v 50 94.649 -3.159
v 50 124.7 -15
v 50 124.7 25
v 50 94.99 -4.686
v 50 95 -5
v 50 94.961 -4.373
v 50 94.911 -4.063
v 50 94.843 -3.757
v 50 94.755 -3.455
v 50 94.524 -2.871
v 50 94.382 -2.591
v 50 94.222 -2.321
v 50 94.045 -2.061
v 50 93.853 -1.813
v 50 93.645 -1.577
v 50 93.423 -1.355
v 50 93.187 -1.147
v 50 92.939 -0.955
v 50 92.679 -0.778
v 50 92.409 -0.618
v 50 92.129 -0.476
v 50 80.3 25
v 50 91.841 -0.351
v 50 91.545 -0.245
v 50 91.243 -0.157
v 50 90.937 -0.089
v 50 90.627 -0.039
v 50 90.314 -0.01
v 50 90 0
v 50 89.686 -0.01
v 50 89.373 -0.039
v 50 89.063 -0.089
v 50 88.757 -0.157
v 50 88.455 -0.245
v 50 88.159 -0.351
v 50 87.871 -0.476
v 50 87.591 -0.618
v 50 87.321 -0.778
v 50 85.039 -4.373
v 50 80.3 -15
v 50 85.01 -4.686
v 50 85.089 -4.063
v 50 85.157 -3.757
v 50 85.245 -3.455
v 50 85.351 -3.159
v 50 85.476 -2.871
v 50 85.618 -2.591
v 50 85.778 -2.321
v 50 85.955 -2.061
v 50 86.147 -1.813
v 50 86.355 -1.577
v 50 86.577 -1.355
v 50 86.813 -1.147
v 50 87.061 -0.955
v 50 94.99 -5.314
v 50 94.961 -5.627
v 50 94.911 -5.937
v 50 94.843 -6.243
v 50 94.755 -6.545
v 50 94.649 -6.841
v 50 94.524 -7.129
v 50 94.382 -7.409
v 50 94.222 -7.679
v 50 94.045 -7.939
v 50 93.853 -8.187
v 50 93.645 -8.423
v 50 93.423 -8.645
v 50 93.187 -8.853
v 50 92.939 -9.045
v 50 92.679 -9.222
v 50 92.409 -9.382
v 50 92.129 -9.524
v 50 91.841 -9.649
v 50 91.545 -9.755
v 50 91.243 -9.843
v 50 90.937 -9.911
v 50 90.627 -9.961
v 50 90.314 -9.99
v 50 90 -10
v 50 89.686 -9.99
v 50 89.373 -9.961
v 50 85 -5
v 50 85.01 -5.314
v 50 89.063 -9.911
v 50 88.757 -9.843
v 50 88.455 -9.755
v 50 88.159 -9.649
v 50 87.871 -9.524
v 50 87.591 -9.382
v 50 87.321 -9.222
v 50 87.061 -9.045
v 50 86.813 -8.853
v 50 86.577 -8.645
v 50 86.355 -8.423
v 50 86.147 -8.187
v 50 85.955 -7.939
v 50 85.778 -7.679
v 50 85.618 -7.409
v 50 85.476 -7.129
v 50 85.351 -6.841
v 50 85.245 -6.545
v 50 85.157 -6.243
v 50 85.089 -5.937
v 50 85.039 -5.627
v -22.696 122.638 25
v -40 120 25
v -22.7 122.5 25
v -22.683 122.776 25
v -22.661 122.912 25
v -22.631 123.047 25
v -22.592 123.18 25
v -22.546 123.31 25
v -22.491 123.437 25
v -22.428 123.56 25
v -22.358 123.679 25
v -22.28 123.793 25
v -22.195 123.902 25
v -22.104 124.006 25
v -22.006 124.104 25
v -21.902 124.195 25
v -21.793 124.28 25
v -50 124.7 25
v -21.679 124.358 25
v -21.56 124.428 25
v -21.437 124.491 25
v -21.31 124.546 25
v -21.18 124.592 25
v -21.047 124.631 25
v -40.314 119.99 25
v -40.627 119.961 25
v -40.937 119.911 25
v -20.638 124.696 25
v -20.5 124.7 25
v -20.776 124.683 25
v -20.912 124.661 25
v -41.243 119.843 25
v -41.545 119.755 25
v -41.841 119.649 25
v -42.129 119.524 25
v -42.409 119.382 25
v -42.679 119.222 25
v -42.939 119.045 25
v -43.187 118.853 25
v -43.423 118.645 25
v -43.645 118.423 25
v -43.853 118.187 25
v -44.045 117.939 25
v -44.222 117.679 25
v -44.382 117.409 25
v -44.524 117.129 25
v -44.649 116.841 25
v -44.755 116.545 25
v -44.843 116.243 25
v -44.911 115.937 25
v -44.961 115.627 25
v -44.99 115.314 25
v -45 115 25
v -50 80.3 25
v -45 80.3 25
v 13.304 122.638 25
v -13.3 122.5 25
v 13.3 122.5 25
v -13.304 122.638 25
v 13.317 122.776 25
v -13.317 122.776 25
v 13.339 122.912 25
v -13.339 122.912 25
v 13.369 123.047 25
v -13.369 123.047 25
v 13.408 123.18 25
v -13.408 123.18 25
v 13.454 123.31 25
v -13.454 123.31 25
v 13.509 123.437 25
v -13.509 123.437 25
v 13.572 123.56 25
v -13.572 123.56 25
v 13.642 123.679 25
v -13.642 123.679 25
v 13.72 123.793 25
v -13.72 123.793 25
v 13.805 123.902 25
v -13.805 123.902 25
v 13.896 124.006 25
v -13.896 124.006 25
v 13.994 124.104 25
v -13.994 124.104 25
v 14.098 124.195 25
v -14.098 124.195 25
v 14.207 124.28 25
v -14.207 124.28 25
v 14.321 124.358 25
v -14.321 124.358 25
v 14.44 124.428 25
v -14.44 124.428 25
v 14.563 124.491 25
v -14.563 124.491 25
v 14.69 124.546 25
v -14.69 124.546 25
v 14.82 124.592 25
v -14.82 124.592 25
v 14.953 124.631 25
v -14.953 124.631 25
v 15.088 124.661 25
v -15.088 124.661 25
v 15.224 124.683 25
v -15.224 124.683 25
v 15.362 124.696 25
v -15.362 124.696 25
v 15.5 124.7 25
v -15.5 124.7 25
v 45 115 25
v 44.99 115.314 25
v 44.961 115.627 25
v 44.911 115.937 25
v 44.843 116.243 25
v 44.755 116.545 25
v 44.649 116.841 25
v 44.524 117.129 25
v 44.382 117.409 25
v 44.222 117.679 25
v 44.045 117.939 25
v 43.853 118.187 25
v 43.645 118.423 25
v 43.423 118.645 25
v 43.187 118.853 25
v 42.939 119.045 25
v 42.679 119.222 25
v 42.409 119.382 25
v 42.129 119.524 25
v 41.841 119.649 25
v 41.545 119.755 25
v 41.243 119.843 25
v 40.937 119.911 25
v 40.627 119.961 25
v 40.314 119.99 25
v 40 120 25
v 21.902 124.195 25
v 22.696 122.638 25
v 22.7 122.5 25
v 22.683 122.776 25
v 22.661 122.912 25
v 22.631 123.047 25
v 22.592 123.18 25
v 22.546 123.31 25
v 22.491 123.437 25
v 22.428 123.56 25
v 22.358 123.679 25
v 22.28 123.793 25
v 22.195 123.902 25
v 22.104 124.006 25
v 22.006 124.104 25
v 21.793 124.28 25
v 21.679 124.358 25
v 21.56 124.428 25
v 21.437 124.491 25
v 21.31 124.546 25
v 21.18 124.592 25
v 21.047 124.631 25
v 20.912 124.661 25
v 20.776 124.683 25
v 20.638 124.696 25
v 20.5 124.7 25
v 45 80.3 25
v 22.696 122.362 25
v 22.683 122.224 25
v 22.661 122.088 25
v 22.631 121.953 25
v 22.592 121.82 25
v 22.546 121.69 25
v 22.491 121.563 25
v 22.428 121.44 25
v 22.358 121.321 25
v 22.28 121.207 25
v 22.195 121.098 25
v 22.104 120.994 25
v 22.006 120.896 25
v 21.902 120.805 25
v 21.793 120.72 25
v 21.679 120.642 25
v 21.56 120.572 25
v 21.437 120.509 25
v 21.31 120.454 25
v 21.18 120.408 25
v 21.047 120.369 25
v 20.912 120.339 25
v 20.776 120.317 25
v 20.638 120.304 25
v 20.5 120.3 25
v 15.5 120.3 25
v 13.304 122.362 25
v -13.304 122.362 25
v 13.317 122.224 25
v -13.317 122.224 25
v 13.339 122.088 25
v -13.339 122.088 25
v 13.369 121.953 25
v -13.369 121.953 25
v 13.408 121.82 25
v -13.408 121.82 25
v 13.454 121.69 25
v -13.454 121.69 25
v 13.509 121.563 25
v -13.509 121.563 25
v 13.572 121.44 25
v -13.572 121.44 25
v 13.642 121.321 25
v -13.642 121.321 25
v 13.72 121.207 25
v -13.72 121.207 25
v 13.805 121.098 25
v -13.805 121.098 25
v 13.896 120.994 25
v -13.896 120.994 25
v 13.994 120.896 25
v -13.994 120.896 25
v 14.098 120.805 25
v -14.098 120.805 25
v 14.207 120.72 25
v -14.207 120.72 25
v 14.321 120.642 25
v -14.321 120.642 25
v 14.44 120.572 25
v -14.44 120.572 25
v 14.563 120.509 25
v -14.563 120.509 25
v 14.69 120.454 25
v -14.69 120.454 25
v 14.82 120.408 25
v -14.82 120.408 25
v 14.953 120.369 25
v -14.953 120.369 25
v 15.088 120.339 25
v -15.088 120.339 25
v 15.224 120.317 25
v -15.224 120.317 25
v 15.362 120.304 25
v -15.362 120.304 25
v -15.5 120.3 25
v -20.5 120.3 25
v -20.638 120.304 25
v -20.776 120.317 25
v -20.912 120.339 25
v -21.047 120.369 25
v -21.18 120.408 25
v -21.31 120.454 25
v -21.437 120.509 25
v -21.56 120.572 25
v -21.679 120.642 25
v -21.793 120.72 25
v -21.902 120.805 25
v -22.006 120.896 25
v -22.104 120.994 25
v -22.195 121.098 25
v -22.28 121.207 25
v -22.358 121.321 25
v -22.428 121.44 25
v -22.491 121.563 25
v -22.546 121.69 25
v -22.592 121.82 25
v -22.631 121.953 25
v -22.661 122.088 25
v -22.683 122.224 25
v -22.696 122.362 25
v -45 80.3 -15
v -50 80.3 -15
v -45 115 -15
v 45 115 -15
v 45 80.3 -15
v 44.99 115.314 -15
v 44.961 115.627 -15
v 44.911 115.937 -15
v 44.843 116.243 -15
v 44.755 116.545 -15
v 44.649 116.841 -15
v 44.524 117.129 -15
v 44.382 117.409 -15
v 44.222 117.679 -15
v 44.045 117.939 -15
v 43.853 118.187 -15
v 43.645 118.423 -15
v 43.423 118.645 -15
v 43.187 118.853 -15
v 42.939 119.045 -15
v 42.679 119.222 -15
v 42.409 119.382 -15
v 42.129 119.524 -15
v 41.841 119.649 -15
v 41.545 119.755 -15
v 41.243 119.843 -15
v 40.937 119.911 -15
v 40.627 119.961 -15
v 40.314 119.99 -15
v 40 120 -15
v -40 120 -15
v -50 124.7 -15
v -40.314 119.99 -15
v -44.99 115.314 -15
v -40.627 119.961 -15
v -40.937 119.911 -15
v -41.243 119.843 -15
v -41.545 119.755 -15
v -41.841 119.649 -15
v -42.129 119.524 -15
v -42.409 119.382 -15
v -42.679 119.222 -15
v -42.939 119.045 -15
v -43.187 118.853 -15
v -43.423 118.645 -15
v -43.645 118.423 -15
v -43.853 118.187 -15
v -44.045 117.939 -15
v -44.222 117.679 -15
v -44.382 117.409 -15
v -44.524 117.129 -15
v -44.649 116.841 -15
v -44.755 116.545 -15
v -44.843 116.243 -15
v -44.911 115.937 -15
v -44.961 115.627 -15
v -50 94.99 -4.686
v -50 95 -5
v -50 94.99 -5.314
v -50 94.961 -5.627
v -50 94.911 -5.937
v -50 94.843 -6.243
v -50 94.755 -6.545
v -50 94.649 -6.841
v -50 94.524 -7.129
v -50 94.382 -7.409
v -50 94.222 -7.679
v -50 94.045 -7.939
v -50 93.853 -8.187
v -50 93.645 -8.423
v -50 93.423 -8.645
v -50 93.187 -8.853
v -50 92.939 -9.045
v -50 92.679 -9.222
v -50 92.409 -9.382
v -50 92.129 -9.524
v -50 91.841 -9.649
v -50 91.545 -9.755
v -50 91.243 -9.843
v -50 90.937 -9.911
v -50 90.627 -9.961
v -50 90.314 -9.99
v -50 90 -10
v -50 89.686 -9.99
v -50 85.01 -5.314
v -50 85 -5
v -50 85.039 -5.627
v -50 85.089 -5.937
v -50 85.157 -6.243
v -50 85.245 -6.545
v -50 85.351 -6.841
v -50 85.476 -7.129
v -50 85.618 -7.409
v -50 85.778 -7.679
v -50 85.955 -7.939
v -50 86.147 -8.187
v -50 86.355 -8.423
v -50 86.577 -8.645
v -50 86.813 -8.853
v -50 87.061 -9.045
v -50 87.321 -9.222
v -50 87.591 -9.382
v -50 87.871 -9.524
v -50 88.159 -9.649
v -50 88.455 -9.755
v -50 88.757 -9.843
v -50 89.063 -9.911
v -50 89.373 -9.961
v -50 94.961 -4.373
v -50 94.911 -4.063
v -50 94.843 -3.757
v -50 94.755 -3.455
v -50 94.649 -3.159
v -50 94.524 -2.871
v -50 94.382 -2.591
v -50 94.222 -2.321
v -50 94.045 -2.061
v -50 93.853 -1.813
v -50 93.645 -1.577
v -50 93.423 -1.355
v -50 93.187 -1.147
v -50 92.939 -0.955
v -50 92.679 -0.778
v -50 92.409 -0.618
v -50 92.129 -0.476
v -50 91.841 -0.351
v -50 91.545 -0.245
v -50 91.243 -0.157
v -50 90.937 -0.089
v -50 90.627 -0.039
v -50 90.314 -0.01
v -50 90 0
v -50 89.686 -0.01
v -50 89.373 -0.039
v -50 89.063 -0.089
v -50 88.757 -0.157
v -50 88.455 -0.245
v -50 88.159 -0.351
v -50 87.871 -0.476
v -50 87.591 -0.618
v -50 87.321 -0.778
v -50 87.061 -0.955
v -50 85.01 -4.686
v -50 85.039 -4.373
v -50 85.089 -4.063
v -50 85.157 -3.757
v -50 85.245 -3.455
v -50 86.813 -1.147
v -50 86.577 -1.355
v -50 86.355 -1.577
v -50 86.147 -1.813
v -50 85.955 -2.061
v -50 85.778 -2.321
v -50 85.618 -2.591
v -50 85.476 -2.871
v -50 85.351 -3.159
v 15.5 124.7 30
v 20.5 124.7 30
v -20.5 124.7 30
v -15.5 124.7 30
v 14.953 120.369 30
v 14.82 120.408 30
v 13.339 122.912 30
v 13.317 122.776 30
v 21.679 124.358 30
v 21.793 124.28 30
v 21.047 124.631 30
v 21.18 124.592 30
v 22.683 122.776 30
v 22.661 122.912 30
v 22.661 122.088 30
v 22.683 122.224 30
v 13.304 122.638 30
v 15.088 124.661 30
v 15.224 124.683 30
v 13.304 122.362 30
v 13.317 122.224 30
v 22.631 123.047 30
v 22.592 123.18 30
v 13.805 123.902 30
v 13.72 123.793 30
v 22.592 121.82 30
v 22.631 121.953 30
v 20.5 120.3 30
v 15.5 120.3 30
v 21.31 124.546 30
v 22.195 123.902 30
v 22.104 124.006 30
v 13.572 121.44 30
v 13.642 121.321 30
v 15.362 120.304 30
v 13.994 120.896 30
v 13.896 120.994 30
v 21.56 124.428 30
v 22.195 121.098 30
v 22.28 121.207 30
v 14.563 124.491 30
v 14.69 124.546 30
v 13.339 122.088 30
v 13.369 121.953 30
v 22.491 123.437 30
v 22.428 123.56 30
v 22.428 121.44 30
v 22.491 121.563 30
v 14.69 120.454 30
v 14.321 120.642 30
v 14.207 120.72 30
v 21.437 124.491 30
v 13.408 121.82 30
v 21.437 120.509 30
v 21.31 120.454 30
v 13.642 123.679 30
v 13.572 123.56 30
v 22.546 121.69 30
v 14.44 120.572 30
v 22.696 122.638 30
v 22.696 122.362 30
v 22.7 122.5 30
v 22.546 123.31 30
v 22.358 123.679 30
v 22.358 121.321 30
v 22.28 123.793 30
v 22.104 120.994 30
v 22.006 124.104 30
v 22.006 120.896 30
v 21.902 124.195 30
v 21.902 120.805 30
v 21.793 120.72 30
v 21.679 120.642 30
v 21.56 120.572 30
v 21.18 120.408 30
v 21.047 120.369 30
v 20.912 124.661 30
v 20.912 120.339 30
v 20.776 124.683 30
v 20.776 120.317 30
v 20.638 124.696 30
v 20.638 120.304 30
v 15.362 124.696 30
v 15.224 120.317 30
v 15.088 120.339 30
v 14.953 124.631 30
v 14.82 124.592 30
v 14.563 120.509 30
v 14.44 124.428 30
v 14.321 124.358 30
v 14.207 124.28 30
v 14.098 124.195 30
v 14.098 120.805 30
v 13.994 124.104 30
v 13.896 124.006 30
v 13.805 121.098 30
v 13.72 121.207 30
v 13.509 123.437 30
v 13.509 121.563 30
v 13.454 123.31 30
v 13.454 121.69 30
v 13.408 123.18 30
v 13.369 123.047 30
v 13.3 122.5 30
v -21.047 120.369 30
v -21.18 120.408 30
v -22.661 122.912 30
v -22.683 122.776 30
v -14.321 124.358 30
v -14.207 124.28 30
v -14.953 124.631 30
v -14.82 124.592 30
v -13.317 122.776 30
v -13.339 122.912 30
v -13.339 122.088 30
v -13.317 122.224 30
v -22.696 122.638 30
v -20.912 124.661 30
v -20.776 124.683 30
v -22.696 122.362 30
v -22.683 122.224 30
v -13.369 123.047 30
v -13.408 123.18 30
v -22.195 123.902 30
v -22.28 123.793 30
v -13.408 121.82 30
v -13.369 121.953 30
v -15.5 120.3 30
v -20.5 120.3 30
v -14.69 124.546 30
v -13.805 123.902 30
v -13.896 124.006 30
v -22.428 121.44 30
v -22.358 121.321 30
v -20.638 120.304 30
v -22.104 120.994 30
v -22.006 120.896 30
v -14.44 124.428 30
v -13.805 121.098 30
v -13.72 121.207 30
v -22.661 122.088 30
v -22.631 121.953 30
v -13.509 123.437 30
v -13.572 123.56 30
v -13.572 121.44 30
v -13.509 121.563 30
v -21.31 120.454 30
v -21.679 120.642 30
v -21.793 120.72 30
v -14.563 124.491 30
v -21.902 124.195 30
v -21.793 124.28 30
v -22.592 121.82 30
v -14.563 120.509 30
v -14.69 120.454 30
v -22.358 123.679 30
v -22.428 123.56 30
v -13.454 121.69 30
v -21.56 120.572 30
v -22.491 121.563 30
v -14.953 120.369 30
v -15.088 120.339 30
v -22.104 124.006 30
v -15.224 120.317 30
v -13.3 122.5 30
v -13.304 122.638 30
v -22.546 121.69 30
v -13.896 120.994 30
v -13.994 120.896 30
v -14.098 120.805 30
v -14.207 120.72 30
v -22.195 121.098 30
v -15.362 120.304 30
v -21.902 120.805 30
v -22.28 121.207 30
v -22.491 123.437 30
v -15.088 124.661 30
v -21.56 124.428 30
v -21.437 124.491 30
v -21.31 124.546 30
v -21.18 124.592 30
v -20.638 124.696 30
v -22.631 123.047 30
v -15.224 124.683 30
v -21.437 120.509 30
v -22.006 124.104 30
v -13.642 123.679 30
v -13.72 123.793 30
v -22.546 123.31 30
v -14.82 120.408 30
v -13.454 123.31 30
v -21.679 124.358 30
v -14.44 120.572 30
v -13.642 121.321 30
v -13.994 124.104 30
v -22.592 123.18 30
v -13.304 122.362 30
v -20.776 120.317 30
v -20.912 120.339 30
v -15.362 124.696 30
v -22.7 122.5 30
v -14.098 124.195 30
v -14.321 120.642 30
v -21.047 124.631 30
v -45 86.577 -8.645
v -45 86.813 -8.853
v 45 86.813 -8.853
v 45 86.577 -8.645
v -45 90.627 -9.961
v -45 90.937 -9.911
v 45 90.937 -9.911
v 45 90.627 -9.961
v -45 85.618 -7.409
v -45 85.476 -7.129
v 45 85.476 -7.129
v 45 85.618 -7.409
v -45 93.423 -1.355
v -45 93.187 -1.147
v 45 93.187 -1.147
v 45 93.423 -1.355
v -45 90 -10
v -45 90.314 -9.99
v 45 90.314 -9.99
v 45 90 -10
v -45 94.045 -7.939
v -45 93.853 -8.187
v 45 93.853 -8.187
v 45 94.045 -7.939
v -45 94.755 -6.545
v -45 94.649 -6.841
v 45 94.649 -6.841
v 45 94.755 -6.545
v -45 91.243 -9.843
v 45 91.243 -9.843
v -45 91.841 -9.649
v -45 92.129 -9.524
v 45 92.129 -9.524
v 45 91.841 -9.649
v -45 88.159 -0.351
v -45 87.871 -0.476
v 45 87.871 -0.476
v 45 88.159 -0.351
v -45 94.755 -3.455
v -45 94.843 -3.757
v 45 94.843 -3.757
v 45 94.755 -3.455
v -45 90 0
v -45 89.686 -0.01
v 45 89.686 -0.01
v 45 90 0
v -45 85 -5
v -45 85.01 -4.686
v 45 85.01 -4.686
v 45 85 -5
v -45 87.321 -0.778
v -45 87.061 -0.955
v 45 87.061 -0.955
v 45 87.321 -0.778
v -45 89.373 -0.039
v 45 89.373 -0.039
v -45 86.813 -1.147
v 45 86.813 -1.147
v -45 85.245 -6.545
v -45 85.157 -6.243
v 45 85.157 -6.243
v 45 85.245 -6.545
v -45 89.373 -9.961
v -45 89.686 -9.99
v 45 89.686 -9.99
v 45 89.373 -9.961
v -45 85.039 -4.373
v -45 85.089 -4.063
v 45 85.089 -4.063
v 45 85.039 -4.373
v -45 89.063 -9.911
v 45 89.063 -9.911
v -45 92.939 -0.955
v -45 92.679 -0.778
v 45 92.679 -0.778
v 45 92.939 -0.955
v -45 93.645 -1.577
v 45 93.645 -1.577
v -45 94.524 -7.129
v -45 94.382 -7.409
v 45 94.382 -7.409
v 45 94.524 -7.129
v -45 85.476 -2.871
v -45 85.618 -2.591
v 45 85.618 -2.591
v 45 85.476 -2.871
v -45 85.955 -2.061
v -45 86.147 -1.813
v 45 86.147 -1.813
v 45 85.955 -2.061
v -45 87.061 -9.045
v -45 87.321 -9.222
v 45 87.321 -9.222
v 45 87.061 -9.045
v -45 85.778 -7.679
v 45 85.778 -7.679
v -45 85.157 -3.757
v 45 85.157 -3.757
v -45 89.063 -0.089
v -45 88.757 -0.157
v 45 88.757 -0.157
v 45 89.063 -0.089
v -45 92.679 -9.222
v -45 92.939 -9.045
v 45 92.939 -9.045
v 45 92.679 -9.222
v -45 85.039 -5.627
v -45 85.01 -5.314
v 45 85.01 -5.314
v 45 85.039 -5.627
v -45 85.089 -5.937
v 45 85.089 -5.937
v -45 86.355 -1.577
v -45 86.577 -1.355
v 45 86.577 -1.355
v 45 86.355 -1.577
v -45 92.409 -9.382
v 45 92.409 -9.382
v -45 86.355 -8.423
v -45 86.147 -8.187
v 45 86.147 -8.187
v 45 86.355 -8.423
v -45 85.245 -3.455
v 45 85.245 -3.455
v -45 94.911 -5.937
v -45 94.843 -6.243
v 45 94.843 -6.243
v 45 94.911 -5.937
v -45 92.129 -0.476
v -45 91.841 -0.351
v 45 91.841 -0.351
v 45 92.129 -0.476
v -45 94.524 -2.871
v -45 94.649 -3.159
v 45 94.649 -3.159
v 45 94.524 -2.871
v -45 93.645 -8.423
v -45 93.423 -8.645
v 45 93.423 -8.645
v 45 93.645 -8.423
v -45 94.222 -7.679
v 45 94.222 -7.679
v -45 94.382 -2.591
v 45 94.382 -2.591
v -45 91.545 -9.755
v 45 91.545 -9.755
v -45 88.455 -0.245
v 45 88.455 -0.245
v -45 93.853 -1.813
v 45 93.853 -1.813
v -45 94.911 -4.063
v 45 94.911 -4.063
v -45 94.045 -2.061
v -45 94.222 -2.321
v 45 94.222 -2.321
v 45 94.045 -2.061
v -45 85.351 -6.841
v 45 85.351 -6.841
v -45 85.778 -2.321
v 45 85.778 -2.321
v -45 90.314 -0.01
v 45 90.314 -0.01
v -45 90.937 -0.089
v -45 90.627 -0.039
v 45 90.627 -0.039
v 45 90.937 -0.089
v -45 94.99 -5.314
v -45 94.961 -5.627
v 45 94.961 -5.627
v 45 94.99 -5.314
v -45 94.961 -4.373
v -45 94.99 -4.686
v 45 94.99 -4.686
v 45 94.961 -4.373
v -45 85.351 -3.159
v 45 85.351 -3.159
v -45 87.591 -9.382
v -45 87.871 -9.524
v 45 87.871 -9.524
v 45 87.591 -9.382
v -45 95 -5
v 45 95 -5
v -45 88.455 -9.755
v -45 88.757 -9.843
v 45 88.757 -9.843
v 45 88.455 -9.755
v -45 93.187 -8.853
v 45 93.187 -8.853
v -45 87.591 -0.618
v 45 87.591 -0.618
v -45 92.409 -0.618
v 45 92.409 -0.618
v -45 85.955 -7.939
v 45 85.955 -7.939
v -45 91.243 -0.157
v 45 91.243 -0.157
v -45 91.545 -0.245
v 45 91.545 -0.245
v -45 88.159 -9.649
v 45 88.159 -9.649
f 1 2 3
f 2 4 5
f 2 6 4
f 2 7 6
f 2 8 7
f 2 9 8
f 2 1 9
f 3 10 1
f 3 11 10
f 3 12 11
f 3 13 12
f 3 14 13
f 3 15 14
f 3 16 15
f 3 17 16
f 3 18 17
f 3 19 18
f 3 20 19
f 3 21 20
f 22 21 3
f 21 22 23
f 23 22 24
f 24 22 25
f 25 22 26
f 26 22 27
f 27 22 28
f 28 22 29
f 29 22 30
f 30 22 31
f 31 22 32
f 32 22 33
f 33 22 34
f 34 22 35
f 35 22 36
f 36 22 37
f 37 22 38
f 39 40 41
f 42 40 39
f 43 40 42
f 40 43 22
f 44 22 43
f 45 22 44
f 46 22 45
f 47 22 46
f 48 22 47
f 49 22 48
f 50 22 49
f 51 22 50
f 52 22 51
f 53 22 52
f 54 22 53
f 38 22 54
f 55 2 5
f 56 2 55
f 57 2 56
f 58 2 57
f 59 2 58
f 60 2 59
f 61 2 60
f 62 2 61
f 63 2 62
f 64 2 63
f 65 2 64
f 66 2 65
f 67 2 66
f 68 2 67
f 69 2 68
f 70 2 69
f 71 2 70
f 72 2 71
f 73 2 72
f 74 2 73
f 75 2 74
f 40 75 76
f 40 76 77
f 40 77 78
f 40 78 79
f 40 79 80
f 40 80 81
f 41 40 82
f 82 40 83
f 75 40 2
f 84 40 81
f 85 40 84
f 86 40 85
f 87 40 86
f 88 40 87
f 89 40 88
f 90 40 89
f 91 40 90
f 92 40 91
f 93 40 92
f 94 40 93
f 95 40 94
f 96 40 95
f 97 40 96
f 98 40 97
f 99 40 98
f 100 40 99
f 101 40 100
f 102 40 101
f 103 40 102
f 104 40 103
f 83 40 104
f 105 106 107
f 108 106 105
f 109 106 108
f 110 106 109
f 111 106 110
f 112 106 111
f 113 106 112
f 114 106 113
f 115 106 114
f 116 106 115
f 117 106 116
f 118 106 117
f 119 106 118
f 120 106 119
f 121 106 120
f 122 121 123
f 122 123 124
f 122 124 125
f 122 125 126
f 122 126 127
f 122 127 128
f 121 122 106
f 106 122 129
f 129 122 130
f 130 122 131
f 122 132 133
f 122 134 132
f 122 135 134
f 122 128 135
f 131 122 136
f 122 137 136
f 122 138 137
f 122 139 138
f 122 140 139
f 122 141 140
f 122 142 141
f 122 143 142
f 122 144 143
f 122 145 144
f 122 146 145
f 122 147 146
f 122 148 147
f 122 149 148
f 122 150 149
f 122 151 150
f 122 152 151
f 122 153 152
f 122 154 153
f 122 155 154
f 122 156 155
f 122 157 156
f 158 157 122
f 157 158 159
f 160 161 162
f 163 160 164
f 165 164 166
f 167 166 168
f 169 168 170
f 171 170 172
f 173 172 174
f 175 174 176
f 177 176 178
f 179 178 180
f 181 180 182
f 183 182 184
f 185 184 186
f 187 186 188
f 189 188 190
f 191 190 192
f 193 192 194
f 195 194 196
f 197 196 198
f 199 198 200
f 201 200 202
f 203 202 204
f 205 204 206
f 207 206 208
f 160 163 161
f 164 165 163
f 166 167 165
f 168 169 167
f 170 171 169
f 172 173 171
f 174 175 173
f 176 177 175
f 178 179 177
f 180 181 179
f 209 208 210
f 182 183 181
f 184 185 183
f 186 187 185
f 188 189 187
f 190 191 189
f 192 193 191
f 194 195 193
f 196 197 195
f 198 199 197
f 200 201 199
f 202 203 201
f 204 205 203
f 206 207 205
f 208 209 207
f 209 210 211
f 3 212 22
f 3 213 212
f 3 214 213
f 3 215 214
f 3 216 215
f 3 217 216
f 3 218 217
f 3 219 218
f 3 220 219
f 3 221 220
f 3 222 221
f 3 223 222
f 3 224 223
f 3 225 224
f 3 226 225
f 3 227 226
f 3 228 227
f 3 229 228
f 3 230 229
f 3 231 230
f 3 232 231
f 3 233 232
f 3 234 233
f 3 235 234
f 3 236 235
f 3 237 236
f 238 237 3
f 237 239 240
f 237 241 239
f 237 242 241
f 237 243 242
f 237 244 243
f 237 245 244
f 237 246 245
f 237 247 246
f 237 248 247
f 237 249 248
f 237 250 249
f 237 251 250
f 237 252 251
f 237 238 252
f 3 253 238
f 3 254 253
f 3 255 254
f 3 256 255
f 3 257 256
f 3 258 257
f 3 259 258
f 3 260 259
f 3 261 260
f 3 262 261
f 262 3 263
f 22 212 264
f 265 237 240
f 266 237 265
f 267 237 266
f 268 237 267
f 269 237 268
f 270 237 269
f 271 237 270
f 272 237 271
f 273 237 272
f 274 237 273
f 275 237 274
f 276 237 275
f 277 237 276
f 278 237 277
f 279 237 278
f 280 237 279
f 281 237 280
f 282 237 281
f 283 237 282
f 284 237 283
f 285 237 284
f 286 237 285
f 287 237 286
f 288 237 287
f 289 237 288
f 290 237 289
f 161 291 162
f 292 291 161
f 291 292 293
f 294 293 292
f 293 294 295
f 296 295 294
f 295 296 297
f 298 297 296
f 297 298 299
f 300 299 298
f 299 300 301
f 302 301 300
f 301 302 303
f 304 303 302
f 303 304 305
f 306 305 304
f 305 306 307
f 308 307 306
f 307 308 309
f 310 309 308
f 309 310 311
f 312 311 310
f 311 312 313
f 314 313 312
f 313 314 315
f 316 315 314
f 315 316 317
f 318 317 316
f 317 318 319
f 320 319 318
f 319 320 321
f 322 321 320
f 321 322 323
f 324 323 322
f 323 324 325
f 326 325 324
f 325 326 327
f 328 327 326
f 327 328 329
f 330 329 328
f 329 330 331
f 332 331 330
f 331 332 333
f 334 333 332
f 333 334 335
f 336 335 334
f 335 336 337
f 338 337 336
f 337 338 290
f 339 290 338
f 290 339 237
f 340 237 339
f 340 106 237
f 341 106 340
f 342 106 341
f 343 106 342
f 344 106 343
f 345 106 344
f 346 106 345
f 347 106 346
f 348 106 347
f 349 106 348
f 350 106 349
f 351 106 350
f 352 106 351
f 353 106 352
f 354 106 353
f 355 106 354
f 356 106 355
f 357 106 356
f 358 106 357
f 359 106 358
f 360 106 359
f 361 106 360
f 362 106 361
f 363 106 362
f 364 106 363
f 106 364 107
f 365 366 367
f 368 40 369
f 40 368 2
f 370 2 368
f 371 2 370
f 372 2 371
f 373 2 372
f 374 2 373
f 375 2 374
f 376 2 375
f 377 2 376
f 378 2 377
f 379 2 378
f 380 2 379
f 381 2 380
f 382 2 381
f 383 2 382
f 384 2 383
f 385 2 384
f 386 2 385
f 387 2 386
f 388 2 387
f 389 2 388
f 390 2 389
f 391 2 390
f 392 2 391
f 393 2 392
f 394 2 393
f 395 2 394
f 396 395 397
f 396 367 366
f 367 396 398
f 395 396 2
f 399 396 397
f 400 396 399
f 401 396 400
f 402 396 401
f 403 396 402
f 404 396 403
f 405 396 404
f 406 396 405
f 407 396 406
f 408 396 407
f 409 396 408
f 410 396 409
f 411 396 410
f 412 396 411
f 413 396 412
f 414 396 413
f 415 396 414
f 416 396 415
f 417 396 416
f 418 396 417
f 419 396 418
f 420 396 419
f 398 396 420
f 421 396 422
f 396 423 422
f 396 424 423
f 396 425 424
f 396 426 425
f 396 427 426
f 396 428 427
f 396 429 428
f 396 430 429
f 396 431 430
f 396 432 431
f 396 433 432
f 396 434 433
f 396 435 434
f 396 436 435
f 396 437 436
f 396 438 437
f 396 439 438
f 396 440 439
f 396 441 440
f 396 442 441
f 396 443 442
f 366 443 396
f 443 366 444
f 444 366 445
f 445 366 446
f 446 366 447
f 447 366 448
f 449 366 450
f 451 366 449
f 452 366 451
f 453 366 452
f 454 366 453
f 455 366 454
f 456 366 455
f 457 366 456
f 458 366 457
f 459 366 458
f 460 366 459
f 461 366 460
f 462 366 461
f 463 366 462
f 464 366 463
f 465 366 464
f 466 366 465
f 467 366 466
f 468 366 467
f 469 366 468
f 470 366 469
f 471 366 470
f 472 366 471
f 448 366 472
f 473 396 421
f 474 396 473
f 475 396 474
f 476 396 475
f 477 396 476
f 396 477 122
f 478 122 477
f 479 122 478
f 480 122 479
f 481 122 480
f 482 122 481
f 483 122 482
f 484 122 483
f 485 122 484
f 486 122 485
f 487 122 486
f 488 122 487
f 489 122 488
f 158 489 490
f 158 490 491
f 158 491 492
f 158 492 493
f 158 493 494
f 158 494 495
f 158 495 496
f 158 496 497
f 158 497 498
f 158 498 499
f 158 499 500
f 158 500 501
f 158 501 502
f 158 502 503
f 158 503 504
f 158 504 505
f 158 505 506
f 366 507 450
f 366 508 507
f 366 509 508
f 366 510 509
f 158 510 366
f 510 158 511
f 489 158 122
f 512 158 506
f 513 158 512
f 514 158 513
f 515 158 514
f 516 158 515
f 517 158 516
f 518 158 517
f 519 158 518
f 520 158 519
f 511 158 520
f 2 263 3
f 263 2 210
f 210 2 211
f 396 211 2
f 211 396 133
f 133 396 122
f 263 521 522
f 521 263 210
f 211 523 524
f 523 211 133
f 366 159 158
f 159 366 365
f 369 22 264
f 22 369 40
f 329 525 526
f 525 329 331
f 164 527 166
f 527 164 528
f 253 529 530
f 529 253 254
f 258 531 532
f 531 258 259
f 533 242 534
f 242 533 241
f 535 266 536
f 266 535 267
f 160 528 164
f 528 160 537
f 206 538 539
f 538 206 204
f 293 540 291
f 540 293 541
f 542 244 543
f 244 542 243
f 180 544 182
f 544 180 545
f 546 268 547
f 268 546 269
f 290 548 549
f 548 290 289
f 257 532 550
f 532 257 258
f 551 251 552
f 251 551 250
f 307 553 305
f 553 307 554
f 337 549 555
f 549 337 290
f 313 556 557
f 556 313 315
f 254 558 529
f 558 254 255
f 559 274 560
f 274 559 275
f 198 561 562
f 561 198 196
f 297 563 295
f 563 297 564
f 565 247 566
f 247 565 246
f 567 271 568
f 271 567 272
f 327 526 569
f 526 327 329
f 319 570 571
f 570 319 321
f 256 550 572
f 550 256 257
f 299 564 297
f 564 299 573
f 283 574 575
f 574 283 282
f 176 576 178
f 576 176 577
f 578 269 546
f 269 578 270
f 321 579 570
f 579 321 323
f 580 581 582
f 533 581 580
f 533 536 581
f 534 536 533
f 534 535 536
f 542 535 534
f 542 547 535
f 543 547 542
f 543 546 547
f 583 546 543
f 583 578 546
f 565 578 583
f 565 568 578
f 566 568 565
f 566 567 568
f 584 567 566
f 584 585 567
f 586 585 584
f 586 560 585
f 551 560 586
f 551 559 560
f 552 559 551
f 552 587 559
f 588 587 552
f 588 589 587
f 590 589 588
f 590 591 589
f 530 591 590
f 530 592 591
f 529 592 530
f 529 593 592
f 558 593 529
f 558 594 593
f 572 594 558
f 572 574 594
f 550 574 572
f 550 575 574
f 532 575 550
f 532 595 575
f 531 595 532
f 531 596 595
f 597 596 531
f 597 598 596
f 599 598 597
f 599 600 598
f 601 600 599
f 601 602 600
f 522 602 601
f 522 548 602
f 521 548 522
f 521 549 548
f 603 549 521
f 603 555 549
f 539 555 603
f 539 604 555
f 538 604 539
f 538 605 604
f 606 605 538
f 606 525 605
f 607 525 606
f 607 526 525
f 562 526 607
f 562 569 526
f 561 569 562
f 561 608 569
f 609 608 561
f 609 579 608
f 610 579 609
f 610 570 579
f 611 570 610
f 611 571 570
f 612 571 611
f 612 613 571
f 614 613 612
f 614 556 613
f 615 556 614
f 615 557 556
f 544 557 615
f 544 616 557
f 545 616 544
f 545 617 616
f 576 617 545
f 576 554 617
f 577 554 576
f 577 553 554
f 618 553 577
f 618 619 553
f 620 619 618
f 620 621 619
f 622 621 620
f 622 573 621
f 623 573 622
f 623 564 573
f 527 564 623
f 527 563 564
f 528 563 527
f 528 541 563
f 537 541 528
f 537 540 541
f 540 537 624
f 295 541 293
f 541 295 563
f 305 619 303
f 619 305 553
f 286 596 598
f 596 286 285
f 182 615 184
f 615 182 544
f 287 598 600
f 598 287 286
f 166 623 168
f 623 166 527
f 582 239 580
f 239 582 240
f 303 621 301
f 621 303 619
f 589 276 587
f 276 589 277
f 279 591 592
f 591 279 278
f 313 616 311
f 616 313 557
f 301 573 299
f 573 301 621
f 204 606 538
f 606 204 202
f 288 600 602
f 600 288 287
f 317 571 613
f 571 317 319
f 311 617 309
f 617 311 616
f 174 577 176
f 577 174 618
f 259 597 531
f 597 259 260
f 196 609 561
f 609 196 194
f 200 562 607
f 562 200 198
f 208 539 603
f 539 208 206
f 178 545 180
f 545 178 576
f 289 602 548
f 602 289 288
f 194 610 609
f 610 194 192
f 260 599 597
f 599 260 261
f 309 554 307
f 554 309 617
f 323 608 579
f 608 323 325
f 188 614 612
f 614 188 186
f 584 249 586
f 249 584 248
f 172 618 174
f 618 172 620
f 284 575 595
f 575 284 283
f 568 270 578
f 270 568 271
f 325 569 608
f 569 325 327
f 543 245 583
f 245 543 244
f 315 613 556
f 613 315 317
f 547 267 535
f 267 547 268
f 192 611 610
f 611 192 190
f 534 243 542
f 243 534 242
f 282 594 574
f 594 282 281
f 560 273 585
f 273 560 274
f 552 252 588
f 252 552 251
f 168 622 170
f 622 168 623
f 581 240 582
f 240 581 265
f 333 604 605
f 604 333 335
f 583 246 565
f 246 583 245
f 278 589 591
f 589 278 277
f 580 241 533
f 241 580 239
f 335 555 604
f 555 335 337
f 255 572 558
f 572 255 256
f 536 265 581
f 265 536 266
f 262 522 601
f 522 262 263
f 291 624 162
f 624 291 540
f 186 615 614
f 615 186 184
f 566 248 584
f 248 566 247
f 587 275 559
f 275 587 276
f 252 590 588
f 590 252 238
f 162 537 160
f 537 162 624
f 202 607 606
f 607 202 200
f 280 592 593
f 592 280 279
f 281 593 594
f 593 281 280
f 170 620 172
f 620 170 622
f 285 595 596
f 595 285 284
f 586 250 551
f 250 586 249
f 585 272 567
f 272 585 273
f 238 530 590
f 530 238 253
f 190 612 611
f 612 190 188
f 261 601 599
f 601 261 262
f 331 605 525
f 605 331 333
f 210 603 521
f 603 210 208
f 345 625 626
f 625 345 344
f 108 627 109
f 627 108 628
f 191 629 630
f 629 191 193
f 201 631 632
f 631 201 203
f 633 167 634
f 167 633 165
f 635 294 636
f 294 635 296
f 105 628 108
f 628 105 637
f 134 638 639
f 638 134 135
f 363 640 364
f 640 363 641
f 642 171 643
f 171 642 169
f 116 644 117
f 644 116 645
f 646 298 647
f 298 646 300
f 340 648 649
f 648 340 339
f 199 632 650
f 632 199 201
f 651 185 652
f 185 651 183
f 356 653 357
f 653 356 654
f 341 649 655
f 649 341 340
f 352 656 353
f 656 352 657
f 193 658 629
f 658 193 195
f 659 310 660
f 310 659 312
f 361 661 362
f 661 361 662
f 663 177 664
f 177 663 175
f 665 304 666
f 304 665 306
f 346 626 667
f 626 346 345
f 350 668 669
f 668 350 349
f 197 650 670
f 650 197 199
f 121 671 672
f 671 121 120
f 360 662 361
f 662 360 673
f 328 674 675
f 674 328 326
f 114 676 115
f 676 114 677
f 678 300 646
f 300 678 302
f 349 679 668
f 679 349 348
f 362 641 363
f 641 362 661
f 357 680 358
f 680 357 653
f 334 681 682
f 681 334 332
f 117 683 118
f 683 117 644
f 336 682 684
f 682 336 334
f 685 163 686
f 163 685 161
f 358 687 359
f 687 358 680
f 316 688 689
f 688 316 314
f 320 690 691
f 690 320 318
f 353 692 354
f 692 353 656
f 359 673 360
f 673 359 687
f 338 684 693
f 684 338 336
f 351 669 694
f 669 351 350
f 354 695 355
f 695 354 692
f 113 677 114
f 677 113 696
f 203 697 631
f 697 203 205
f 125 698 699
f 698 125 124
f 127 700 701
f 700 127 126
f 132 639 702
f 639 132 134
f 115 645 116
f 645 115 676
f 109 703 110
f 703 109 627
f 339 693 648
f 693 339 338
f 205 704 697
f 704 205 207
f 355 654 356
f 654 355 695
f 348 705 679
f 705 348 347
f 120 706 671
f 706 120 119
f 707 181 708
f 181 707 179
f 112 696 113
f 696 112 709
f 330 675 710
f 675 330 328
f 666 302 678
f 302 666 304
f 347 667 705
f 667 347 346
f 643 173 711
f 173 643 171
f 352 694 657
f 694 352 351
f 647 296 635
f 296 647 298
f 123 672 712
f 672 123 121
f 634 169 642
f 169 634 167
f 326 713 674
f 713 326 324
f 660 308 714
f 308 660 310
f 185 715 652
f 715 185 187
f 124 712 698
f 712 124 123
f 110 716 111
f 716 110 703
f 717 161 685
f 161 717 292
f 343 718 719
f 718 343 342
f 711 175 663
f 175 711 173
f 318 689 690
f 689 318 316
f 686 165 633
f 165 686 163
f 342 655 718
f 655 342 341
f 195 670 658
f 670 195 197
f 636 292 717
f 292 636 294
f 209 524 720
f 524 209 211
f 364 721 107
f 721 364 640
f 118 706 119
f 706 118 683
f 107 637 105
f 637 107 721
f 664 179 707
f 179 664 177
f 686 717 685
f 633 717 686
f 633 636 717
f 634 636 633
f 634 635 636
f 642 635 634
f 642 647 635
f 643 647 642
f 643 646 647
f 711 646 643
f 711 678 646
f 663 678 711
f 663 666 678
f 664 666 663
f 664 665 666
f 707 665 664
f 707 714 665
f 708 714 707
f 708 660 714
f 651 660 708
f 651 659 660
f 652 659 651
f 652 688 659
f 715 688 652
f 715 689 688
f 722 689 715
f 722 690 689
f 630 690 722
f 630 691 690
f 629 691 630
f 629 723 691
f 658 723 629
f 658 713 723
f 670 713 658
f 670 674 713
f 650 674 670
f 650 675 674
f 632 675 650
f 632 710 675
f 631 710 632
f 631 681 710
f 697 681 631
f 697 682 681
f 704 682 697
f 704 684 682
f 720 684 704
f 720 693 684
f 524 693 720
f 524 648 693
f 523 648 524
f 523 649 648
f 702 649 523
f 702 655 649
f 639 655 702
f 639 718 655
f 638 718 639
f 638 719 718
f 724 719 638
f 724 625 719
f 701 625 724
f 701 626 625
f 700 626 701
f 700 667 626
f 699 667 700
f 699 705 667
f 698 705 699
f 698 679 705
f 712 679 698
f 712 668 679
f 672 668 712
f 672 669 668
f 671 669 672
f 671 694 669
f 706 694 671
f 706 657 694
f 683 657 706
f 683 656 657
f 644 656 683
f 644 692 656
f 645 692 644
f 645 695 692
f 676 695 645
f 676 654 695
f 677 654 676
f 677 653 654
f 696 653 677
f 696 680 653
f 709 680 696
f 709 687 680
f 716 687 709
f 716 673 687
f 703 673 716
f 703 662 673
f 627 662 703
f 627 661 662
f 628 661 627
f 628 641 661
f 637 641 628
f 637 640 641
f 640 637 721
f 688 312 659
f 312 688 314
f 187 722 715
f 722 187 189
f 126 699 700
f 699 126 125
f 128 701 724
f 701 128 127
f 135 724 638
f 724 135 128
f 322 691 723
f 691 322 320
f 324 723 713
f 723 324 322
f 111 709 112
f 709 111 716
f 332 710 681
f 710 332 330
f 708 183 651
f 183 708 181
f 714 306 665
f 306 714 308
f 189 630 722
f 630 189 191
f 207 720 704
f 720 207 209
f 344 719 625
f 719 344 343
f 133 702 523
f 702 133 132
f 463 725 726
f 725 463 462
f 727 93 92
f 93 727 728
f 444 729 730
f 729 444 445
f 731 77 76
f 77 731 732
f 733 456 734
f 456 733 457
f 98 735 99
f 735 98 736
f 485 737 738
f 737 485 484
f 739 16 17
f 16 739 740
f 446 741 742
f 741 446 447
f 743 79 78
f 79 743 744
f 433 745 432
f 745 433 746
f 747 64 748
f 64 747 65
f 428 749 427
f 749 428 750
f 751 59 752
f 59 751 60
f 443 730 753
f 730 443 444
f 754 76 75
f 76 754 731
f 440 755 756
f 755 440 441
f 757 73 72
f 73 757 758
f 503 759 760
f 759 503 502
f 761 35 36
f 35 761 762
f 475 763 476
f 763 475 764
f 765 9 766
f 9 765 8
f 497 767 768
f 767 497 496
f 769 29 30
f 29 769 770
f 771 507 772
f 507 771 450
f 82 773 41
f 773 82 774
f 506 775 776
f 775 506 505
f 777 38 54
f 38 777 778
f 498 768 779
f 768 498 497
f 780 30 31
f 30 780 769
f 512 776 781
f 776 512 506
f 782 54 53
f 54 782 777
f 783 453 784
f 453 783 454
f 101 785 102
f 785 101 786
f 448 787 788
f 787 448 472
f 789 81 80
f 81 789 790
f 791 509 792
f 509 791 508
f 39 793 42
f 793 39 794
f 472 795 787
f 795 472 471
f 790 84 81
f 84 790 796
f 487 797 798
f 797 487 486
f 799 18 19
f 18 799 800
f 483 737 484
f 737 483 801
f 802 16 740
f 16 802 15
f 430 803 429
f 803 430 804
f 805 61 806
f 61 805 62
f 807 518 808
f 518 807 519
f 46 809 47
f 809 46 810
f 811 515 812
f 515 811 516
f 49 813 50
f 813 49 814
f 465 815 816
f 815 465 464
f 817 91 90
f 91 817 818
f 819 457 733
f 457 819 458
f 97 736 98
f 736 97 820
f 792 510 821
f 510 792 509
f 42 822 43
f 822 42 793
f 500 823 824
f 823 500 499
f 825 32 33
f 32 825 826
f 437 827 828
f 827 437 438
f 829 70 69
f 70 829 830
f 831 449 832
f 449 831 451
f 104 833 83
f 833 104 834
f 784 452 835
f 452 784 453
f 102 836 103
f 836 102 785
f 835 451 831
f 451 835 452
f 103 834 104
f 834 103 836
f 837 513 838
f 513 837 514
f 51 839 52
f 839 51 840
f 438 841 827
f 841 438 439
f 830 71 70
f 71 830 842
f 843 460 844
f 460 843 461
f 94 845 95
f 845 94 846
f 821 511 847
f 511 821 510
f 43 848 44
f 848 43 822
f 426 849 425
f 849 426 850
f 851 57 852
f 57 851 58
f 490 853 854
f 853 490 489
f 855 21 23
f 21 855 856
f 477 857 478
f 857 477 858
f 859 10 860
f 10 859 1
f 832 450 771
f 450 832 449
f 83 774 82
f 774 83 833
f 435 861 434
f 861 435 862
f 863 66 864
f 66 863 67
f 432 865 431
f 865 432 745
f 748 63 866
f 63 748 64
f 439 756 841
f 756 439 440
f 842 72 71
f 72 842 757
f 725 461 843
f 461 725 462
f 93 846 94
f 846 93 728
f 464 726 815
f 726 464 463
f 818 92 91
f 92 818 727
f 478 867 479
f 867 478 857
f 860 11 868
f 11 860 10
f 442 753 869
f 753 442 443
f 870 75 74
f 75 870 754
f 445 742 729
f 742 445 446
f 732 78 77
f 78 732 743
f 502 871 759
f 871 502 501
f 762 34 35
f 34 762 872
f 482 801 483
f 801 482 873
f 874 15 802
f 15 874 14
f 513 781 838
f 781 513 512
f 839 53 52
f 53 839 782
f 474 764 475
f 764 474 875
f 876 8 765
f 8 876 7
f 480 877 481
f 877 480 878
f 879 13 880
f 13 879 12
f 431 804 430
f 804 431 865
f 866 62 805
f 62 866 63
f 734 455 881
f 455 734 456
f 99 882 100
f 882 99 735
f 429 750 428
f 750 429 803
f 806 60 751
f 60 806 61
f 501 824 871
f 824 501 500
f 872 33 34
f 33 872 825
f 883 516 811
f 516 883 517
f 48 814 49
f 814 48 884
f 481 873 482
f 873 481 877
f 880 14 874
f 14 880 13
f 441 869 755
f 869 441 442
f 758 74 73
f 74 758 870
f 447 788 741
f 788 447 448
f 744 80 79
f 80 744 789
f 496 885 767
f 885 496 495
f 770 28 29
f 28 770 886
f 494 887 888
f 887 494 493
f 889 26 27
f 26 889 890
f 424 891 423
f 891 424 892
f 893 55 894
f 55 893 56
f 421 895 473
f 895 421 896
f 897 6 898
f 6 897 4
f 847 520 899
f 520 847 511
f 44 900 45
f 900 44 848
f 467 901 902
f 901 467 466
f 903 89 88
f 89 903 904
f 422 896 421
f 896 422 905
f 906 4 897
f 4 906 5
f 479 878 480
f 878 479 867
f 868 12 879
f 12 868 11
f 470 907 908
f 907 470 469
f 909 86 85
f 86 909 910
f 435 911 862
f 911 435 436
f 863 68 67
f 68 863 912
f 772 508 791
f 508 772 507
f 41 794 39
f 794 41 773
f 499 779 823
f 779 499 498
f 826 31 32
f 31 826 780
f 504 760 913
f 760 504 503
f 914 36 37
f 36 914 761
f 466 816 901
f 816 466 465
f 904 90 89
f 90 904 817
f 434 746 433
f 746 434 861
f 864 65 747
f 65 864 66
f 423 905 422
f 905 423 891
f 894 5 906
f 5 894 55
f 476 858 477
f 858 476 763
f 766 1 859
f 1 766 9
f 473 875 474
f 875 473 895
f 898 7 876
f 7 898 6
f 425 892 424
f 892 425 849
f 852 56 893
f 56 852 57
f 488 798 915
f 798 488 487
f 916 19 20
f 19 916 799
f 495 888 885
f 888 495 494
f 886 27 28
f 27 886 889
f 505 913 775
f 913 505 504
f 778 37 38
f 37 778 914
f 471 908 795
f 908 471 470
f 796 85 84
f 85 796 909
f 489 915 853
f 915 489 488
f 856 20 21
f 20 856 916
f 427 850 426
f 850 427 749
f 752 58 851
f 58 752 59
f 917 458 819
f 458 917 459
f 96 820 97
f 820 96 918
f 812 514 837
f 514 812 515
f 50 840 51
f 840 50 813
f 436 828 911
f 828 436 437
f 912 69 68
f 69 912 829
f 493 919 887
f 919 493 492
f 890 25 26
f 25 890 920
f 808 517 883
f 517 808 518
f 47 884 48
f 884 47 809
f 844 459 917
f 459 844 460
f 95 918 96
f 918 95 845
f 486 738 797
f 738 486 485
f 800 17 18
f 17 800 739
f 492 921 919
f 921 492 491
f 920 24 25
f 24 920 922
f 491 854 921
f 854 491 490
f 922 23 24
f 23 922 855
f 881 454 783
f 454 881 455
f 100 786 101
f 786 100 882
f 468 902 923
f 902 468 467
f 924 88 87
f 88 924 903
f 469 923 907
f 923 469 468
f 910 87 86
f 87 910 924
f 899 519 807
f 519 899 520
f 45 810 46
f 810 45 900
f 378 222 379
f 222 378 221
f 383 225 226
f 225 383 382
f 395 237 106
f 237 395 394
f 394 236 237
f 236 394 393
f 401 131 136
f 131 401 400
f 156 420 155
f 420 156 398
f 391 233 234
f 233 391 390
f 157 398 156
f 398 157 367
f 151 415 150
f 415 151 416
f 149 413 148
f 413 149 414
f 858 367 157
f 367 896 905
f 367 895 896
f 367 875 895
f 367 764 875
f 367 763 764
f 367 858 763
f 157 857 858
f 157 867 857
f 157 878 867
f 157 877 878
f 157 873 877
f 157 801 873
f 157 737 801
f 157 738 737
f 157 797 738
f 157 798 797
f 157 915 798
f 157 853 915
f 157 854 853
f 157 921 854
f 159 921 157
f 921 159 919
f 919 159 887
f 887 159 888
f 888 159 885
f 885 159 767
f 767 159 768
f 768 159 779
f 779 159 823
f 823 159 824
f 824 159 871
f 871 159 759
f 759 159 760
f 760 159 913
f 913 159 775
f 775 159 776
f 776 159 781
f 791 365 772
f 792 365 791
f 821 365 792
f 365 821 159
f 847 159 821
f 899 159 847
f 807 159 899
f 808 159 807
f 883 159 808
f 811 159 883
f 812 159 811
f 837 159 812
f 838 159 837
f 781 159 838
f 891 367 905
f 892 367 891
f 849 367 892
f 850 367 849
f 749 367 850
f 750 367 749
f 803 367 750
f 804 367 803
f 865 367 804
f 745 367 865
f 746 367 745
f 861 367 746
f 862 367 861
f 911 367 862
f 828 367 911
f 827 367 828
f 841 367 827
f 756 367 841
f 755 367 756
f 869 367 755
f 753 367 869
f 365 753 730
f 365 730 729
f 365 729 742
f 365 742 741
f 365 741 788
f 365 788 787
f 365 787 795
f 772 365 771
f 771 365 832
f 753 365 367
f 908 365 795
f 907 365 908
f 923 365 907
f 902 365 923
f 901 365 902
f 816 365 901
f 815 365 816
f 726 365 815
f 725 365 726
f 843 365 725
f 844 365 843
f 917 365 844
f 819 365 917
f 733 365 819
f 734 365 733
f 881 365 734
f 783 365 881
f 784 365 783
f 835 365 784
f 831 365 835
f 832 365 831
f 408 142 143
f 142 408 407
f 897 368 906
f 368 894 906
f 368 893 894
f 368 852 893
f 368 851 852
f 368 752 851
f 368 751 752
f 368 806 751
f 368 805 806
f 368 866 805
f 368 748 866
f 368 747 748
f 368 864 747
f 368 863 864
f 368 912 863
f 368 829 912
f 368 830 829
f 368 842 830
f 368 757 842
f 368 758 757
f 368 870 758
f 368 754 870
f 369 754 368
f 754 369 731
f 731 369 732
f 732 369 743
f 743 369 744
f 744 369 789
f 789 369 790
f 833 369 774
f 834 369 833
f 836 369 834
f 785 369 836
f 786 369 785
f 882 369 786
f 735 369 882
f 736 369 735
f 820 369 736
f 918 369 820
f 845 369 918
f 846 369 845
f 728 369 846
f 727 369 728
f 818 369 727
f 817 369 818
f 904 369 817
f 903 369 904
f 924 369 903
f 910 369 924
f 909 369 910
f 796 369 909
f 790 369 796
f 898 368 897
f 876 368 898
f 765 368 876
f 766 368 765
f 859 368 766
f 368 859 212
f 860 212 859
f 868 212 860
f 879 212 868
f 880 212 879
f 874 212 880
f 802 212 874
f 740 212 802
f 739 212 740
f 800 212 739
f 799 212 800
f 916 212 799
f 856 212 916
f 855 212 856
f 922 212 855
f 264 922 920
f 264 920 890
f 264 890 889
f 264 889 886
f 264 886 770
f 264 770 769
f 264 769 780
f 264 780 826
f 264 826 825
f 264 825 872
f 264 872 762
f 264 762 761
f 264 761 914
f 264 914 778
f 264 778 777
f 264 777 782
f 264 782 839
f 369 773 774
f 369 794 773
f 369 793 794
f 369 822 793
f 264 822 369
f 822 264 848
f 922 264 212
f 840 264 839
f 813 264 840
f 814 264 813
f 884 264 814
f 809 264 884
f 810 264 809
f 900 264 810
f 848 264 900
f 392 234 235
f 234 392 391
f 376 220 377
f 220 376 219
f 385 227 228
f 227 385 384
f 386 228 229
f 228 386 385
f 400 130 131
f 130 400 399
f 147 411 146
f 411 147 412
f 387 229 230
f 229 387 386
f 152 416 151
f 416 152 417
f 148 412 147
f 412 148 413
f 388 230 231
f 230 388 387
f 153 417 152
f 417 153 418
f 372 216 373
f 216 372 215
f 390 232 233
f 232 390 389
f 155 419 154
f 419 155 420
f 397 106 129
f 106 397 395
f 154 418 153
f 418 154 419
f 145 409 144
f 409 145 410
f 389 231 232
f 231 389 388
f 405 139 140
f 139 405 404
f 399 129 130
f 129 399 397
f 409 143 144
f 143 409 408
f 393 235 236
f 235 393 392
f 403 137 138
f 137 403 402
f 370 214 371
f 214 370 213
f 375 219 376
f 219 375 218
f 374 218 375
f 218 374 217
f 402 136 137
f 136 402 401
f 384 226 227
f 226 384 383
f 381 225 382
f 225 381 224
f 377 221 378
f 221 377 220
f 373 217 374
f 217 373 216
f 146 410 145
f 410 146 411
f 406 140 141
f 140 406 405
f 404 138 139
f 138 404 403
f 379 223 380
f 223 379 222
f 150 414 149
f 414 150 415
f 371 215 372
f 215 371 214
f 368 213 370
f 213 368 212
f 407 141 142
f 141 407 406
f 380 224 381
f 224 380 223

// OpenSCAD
$fn=100;
//boxlib();
!boxFix();
module boxlib(){
    translate([0,0,-2]) rotate_extrude() translate([2.5,0]) square([32,2]); 
    translate([0,0,0]) rotate_extrude() translate([30,0]) polygon([[0,0],[1.5,0],[1.5,6],[1.8,7],[1.8,8],[1.5,9],[0,9]]);
}

module boxFix(){
    // cube([90,240,20],center=true);

    difference(){
    
        translate([0,122.5,15]) {
            translate([0,-20,-10]){ 
                cube([100,44.4,40],center=true);
                //cylinder(d=10,h=1,center=true);
            
            }
            translate([18,0,0])  hull(){
                translate([2.5,0,0]) cylinder(d=4.4,h=15,center=false);
                translate([-2.5,0,0]) cylinder(d=4.4,h=15,center=false);
            }
            translate([-18,0,0])  hull(){
                translate([2.5,0,0]) cylinder(d=4.4,h=15,center=false);
                translate([-2.5,0,0]) cylinder(d=4.4,h=15,center=false);
            }
            
        }
        translate([0,90,-5]) rotate([0,90,0]) cylinder(d=10,h=150,center=true);
        minkowski(){
            cube([90-10,240-10,50],center=true);
            cylinder(d=10,h=1,center=true);
        }
    }

}
 
